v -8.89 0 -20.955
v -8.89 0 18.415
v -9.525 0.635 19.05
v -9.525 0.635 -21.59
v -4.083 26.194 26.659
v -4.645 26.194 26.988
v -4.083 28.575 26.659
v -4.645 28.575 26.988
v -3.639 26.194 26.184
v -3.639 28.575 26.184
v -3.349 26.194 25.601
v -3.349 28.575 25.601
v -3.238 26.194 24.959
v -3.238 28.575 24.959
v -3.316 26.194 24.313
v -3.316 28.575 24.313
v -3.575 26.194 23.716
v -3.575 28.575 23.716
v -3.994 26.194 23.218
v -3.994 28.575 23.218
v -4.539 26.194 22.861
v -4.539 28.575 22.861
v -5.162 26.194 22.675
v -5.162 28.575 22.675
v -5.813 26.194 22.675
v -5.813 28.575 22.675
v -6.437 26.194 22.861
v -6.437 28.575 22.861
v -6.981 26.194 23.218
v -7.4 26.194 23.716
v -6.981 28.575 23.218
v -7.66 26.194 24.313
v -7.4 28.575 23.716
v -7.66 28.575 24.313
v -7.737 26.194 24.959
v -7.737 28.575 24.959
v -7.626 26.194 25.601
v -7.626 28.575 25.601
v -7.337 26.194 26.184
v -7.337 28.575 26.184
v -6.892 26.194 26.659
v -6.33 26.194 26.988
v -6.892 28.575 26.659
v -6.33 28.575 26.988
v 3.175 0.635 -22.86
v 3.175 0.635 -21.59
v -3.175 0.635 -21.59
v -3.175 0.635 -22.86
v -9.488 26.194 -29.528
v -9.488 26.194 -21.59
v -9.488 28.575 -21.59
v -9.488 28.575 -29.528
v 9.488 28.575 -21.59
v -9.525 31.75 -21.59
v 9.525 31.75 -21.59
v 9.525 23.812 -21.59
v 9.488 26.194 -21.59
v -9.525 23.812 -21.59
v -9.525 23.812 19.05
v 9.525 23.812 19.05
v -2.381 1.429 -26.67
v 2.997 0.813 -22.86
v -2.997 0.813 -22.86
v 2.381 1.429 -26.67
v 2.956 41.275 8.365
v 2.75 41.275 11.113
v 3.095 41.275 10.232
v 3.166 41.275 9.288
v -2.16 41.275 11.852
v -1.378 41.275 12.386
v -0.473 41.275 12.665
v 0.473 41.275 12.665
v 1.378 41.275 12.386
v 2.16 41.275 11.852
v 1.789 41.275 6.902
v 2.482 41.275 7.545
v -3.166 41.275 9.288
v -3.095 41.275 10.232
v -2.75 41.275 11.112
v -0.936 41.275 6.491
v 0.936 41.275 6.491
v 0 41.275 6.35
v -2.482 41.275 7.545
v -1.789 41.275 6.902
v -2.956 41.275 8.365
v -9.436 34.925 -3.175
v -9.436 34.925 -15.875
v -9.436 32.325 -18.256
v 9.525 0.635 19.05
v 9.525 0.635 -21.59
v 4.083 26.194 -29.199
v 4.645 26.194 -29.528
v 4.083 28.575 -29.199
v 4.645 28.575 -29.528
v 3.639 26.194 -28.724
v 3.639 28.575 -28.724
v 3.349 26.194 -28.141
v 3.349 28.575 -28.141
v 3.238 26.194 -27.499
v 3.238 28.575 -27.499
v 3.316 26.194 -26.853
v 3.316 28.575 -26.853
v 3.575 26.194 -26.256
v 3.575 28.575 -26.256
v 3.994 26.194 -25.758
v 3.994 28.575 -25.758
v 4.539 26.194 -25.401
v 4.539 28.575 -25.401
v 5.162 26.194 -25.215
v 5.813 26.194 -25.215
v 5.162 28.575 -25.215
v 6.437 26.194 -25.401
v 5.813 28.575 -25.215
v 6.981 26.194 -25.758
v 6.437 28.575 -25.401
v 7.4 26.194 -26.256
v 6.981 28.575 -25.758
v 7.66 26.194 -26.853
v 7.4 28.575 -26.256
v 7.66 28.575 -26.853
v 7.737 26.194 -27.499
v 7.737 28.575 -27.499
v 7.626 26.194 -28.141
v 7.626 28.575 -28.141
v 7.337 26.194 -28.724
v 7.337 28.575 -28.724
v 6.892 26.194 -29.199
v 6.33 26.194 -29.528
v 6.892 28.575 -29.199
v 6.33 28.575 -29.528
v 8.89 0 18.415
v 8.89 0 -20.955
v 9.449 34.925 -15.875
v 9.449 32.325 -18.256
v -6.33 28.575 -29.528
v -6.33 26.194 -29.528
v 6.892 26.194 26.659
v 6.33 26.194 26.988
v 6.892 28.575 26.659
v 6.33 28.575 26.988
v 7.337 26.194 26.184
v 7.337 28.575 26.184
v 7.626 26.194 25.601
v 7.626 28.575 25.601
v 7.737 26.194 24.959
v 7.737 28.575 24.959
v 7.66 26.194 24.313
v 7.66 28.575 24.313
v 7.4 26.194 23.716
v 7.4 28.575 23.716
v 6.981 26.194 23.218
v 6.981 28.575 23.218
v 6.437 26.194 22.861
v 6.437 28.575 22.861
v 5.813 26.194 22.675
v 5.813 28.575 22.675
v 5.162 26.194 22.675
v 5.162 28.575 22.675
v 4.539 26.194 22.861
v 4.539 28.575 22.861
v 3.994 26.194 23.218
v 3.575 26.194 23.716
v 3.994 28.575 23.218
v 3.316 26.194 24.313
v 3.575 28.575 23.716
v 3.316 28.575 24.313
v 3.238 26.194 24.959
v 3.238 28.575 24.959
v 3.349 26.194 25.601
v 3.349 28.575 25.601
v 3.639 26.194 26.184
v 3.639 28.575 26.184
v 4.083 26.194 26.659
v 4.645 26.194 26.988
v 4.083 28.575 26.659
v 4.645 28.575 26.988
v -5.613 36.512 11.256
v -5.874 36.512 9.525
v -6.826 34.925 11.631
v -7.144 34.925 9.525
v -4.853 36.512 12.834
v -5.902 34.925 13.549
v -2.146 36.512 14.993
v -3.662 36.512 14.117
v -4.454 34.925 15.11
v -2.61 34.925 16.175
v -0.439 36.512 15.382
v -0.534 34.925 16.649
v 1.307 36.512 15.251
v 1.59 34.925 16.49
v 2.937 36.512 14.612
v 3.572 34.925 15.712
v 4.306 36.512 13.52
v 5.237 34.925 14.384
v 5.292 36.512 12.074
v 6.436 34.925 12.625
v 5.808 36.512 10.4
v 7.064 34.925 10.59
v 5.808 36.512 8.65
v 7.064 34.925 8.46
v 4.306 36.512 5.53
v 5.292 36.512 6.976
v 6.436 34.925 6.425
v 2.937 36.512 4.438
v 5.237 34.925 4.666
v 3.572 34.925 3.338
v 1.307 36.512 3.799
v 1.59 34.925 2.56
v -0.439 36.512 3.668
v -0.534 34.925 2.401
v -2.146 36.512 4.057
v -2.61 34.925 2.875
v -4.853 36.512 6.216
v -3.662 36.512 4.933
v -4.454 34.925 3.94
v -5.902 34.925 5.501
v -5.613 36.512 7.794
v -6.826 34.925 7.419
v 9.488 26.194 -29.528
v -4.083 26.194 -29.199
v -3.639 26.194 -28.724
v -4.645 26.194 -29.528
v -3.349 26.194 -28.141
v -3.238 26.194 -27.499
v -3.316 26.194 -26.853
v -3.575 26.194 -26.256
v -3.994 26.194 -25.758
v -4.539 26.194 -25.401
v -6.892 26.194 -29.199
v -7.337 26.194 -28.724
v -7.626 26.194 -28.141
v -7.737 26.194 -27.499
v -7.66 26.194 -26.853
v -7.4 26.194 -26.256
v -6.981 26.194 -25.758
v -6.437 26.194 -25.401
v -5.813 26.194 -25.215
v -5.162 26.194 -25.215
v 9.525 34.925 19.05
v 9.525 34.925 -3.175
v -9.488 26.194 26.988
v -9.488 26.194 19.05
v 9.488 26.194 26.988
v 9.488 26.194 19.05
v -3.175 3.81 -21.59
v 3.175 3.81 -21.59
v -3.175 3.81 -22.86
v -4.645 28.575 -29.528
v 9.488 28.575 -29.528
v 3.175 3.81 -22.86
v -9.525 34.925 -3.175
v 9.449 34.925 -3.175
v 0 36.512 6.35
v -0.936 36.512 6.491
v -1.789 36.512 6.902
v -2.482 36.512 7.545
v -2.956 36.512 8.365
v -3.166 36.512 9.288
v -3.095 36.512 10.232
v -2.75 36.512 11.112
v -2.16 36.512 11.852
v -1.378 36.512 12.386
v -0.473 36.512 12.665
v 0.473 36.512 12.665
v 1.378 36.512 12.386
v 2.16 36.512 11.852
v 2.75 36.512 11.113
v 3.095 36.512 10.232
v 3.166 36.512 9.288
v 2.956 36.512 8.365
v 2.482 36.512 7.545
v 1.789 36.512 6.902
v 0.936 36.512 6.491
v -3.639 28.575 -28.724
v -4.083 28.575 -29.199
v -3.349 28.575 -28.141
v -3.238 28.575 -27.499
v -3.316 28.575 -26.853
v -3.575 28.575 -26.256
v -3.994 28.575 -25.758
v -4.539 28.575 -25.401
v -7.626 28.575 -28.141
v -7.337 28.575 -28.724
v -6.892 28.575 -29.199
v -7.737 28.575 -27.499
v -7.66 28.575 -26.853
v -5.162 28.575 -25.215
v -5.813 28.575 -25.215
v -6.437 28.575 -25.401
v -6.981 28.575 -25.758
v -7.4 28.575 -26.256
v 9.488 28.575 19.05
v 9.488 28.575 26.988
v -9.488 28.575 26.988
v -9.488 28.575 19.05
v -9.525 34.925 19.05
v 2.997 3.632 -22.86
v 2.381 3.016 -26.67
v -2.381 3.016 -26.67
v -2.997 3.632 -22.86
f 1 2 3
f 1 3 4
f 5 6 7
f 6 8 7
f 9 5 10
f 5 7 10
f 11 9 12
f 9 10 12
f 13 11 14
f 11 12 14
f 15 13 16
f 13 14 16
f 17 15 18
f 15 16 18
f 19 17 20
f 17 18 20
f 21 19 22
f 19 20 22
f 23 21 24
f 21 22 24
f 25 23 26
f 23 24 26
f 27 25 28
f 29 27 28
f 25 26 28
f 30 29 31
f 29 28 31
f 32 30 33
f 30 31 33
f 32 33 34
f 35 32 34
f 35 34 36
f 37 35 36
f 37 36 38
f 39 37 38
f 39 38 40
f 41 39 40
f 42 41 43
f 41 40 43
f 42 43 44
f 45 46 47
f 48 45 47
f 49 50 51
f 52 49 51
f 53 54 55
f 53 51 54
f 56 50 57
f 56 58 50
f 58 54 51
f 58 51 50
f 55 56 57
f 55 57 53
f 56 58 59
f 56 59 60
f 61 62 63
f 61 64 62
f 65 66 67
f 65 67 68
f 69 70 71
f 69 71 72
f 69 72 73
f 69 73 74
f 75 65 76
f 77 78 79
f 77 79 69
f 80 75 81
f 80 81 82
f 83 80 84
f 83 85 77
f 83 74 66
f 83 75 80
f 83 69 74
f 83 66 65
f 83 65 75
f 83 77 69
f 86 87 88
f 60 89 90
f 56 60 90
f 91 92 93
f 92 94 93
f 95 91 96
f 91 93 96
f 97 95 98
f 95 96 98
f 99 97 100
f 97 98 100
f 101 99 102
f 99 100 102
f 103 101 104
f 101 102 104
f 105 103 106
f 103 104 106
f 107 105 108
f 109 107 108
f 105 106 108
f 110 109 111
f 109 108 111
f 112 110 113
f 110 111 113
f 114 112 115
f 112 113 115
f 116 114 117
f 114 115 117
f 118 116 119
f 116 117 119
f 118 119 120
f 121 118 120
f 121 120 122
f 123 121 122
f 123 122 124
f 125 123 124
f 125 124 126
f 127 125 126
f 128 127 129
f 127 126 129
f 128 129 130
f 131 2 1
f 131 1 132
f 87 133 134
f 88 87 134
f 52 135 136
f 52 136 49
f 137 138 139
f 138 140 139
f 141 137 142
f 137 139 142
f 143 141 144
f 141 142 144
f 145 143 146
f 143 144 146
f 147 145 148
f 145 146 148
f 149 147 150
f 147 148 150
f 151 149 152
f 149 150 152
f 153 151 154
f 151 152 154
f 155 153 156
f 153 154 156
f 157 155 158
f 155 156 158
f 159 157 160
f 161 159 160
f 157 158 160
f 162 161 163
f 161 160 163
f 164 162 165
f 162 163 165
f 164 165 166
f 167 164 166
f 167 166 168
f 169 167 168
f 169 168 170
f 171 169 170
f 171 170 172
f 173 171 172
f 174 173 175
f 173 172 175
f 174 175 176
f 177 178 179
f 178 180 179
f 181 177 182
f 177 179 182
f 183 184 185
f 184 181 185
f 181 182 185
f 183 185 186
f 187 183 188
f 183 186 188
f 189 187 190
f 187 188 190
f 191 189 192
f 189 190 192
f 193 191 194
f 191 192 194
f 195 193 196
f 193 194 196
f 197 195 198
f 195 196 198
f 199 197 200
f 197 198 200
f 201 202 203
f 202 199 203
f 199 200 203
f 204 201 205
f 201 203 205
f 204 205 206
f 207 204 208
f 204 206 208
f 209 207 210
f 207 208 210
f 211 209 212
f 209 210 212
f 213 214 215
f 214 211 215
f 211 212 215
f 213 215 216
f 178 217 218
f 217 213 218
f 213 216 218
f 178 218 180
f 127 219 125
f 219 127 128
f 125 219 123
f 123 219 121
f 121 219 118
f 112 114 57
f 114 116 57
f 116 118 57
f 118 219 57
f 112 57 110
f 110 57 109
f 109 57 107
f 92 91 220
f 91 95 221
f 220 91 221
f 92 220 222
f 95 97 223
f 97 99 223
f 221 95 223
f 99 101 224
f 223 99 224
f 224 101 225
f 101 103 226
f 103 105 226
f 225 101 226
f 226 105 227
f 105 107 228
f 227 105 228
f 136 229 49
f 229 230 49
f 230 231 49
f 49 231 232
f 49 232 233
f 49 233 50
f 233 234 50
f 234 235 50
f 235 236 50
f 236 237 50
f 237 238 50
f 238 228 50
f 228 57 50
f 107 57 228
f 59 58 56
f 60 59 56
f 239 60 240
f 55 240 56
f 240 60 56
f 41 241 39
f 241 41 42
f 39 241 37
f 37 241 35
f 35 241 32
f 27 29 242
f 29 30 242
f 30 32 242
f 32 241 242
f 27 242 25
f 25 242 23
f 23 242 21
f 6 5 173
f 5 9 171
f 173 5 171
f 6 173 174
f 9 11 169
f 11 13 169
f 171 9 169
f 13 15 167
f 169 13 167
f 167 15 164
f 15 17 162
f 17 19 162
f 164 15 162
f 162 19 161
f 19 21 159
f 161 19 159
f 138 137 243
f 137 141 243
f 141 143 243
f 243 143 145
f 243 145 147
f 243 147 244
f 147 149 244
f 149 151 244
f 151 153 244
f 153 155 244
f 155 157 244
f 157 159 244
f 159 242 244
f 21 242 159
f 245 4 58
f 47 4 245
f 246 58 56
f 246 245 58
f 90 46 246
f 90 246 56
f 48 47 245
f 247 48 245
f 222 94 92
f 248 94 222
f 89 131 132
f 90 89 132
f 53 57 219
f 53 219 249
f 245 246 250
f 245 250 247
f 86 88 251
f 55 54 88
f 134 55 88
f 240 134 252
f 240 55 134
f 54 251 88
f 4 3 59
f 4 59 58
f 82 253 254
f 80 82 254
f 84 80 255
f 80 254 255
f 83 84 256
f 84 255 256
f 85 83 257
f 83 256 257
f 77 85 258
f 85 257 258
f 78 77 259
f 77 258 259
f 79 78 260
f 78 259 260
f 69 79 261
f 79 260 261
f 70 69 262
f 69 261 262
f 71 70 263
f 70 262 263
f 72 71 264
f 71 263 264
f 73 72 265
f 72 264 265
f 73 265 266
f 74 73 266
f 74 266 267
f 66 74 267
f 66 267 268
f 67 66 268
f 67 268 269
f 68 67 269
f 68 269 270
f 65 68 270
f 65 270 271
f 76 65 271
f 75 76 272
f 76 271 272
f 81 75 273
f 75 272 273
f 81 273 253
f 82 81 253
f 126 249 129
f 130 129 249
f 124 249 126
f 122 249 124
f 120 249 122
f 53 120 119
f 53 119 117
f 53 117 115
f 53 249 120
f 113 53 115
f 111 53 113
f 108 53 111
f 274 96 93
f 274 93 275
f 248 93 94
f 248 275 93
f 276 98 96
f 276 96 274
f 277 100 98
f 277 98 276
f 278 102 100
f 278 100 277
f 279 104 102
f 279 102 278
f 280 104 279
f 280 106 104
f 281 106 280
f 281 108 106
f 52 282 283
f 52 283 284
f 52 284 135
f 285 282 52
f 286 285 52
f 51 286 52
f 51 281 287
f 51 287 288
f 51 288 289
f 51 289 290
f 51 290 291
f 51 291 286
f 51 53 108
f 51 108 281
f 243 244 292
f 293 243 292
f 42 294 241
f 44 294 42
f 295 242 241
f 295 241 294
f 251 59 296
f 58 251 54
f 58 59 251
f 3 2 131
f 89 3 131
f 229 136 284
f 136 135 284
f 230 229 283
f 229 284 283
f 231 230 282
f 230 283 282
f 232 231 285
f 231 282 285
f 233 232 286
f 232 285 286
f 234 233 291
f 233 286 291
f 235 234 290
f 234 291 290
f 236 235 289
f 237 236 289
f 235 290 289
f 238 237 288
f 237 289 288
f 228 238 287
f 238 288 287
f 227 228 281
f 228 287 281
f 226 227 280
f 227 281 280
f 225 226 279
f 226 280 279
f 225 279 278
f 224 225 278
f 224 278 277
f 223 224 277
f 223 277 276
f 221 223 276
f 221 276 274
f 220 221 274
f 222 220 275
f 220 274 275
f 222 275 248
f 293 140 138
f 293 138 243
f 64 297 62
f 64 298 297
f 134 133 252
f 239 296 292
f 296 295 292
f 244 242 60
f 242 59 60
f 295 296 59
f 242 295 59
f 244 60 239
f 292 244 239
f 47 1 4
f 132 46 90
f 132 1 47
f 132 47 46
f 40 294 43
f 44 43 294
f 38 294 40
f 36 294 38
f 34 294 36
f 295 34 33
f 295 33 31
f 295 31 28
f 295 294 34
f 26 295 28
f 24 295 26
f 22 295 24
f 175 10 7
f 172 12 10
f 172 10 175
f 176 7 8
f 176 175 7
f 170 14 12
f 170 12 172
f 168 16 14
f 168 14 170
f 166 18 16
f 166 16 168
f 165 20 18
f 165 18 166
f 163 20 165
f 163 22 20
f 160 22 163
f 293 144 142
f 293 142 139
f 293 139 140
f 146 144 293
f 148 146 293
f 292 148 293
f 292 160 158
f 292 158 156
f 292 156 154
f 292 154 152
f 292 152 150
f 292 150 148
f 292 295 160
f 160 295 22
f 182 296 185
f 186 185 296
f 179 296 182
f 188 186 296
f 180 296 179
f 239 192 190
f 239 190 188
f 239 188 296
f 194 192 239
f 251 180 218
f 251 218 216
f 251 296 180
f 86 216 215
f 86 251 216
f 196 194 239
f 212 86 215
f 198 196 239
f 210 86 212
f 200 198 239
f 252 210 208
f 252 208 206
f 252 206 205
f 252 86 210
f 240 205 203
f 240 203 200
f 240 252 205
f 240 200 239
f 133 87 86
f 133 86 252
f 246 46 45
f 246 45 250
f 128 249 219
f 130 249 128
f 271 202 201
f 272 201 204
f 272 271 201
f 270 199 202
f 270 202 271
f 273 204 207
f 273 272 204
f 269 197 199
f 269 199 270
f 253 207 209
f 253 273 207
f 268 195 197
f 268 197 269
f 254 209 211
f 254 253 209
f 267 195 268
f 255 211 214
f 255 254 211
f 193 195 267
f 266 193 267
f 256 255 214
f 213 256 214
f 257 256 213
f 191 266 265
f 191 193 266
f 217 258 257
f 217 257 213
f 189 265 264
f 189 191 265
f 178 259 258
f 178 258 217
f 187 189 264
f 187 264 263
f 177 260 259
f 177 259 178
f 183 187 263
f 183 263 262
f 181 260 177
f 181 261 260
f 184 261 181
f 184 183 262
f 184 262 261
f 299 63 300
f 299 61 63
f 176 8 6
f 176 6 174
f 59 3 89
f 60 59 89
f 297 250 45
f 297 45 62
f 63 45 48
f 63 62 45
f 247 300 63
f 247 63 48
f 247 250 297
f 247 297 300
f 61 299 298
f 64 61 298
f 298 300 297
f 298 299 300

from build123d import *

# Parameters (mm, degrees)
SKETCH1_W            = 19.05
SKETCH1_H            = 40.64
BOSS_EXTRUDE1_DEPTH  = 23.8125
CHAMFER1_SIZE        = 0.635
SKETCH2_W            = 6.35
SKETCH2_H            = 3.175
BOSS_EXTRUDE3_DEPTH  = 1.27
SKETCH6_W            = 19.05
SKETCH6_H            = 40.64
BOSS_EXTRUDE6_DEPTH  = 11.1125
CUT_EXTRUDE1_DEPTH   = 48.895167087
BOSS_EXTRUDE7_DEPTH  = 18.8849
SKETCH13_R           = 5.87375
SKETCH12_R           = 7.14375
SKETCH14_R           = 3.175
BOSS_EXTRUDE8_DEPTH  = 4.7625
SKETCH15_W           = 18.975487788
SKETCH15_H           = 2.38125
BOSS_EXTRUDE9_DEPTH  = 7.9375
SKETCH16_W           = 18.975487788
SKETCH16_H           = 2.38125
BOSS_EXTRUDE10_DEPTH = 7.9375
SKETCH17_R           = 2.25
CUT_EXTRUDE2_DEPTH   = 43.179728618


with BuildPart() as part:
    # Sketch1 → Boss-Extrude1 (new body)
    with BuildSketch(Plane(origin=(0, 0, 0), x_dir=(1, 0, 0), z_dir=(0, 1, 0))):
        with Locations((0, 1.27)):
            Rectangle(SKETCH1_W, SKETCH1_H)
    extrude(amount=BOSS_EXTRUDE1_DEPTH)

    # Chamfer1
    chamfer1_edges = [part.edges().sort_by_distance(p)[0] for p in [
        (0, 0, -21.59),
        (9.525, 0, -1.27),
        (0, 0, 19.05),
        (-9.525, 0, -1.27),
    ]]
    chamfer(chamfer1_edges, length=CHAMFER1_SIZE)

    # Sketch2 → Boss-Extrude3 (add)
    with BuildSketch(Plane(origin=(0, 0, -21.59), x_dir=(-1, 0, 0), z_dir=(0, 0, -1))):
        with Locations((0, 2.2225)):
            Rectangle(SKETCH2_W, SKETCH2_H)
    extrude(amount=BOSS_EXTRUDE3_DEPTH)

    # Sketch4 → Loft1 section 0
    with BuildSketch(Plane(origin=(0, 0, -22.86), x_dir=(-1, 0, 0), z_dir=(0, 0, -1))):
        with BuildLine():
            Line((2.9972, 3.6322), (-2.9972, 3.6322))
            Line((-2.9972, 3.6322), (-2.9972, 0.8128))
            Line((-2.9972, 0.8128), (2.9972, 0.8128))
            Line((2.9972, 0.8128), (2.9972, 3.6322))
        make_face()
    # Sketch3 → Loft1 section 1
    with BuildSketch(Plane(origin=(0, 0, -26.67), x_dir=(-1, 0, 0), z_dir=(0, 0, -1))):
        with BuildLine():
            Line((2.38125, 3.01625), (-2.38125, 3.01625))
            Line((-2.38125, 3.01625), (-2.38125, 1.42875))
            Line((-2.38125, 1.42875), (2.38125, 1.42875))
            Line((2.38125, 1.42875), (2.38125, 3.01625))
        make_face()
    loft()


with BuildPart() as body_2:
    # Sketch6 → Boss-Extrude6 (new body)
    with BuildSketch(Plane(origin=(0, 23.8125, 0), x_dir=(1, 0, 0), z_dir=(0, 1, 0))):
        with Locations((0, 1.27)):
            Rectangle(SKETCH6_W, SKETCH6_H)
    extrude(amount=BOSS_EXTRUDE6_DEPTH)

    # Sketch8 → Cut-Extrude1 (cut, through all)
    with BuildSketch(Plane(origin=(9.525, 0, 0), x_dir=(0, 0, -1), z_dir=(1, 0, 0))):
        Polygon((21.59, 31.75), (3.175, 34.925), (21.59, 34.925), align=None)
    extrude(amount=-CUT_EXTRUDE1_DEPTH, mode=Mode.SUBTRACT)

    # Sketch11 → Boss-Extrude7 (add)
    with BuildSketch(Plane(origin=(9.4488, 0, 0), x_dir=(0, 0, -1), z_dir=(1, 0, 0))):
        Polygon((3.175, 34.925), (15.875, 34.925), (18.25625, 32.324784483), align=None)
    extrude(amount=-BOSS_EXTRUDE7_DEPTH)

    # Sketch13 → Loft5 section 0
    with BuildSketch(Plane(origin=(0, 36.5125, 0), x_dir=(-1, 0, 0), z_dir=(0, 1, 0))):
        with Locations((0, 9.525)):
            Circle(SKETCH13_R)
    # Sketch12 → Loft5 section 1
    with BuildSketch(Plane(origin=(0, 34.925, 0), x_dir=(1, 0, 0), z_dir=(0, 1, 0))):
        with Locations((0, -9.525)):
            Circle(SKETCH12_R)
    loft()

    # Sketch14 → Boss-Extrude8 (add)
    with BuildSketch(Plane(origin=(0, 36.5125, 0), x_dir=(1, 0, 0), z_dir=(0, 1, 0))):
        with Locations(Location((0, -9.525, 0), (0, 0, 90))):
            Circle(SKETCH14_R)
    extrude(amount=BOSS_EXTRUDE8_DEPTH)

    # Sketch15 → Boss-Extrude9 (add)
    with BuildSketch(Plane(origin=(0, 0, -21.59), x_dir=(-1, 0, 0), z_dir=(0, 0, -1))):
        with Locations((0, 27.384375)):
            Rectangle(SKETCH15_W, SKETCH15_H)
    extrude(amount=BOSS_EXTRUDE9_DEPTH)

    # Sketch16 → Boss-Extrude10 (add)
    with BuildSketch(Plane.XY.offset(19.05)):
        with Locations((0, 27.384375)):
            Rectangle(SKETCH16_W, SKETCH16_H)
    extrude(amount=BOSS_EXTRUDE10_DEPTH)

    # Sketch17 → Cut-Extrude2 (cut, through all)
    with BuildSketch(Plane(origin=(0, 28.575, 0), x_dir=(1, 0, 0), z_dir=(0, 1, 0))):
        with Locations((5.487743894, -24.901198221)):
            Circle(SKETCH17_R)
        with Locations((-5.487743894, -24.901198221)):
            Circle(SKETCH17_R)
        with Locations((-5.487743894, 27.441198221)):
            Circle(SKETCH17_R)
        with Locations((5.487743894, 27.441198221)):
            Circle(SKETCH17_R)
    extrude(amount=-CUT_EXTRUDE2_DEPTH, mode=Mode.SUBTRACT)


solid = Compound([part.part, body_2.part])
